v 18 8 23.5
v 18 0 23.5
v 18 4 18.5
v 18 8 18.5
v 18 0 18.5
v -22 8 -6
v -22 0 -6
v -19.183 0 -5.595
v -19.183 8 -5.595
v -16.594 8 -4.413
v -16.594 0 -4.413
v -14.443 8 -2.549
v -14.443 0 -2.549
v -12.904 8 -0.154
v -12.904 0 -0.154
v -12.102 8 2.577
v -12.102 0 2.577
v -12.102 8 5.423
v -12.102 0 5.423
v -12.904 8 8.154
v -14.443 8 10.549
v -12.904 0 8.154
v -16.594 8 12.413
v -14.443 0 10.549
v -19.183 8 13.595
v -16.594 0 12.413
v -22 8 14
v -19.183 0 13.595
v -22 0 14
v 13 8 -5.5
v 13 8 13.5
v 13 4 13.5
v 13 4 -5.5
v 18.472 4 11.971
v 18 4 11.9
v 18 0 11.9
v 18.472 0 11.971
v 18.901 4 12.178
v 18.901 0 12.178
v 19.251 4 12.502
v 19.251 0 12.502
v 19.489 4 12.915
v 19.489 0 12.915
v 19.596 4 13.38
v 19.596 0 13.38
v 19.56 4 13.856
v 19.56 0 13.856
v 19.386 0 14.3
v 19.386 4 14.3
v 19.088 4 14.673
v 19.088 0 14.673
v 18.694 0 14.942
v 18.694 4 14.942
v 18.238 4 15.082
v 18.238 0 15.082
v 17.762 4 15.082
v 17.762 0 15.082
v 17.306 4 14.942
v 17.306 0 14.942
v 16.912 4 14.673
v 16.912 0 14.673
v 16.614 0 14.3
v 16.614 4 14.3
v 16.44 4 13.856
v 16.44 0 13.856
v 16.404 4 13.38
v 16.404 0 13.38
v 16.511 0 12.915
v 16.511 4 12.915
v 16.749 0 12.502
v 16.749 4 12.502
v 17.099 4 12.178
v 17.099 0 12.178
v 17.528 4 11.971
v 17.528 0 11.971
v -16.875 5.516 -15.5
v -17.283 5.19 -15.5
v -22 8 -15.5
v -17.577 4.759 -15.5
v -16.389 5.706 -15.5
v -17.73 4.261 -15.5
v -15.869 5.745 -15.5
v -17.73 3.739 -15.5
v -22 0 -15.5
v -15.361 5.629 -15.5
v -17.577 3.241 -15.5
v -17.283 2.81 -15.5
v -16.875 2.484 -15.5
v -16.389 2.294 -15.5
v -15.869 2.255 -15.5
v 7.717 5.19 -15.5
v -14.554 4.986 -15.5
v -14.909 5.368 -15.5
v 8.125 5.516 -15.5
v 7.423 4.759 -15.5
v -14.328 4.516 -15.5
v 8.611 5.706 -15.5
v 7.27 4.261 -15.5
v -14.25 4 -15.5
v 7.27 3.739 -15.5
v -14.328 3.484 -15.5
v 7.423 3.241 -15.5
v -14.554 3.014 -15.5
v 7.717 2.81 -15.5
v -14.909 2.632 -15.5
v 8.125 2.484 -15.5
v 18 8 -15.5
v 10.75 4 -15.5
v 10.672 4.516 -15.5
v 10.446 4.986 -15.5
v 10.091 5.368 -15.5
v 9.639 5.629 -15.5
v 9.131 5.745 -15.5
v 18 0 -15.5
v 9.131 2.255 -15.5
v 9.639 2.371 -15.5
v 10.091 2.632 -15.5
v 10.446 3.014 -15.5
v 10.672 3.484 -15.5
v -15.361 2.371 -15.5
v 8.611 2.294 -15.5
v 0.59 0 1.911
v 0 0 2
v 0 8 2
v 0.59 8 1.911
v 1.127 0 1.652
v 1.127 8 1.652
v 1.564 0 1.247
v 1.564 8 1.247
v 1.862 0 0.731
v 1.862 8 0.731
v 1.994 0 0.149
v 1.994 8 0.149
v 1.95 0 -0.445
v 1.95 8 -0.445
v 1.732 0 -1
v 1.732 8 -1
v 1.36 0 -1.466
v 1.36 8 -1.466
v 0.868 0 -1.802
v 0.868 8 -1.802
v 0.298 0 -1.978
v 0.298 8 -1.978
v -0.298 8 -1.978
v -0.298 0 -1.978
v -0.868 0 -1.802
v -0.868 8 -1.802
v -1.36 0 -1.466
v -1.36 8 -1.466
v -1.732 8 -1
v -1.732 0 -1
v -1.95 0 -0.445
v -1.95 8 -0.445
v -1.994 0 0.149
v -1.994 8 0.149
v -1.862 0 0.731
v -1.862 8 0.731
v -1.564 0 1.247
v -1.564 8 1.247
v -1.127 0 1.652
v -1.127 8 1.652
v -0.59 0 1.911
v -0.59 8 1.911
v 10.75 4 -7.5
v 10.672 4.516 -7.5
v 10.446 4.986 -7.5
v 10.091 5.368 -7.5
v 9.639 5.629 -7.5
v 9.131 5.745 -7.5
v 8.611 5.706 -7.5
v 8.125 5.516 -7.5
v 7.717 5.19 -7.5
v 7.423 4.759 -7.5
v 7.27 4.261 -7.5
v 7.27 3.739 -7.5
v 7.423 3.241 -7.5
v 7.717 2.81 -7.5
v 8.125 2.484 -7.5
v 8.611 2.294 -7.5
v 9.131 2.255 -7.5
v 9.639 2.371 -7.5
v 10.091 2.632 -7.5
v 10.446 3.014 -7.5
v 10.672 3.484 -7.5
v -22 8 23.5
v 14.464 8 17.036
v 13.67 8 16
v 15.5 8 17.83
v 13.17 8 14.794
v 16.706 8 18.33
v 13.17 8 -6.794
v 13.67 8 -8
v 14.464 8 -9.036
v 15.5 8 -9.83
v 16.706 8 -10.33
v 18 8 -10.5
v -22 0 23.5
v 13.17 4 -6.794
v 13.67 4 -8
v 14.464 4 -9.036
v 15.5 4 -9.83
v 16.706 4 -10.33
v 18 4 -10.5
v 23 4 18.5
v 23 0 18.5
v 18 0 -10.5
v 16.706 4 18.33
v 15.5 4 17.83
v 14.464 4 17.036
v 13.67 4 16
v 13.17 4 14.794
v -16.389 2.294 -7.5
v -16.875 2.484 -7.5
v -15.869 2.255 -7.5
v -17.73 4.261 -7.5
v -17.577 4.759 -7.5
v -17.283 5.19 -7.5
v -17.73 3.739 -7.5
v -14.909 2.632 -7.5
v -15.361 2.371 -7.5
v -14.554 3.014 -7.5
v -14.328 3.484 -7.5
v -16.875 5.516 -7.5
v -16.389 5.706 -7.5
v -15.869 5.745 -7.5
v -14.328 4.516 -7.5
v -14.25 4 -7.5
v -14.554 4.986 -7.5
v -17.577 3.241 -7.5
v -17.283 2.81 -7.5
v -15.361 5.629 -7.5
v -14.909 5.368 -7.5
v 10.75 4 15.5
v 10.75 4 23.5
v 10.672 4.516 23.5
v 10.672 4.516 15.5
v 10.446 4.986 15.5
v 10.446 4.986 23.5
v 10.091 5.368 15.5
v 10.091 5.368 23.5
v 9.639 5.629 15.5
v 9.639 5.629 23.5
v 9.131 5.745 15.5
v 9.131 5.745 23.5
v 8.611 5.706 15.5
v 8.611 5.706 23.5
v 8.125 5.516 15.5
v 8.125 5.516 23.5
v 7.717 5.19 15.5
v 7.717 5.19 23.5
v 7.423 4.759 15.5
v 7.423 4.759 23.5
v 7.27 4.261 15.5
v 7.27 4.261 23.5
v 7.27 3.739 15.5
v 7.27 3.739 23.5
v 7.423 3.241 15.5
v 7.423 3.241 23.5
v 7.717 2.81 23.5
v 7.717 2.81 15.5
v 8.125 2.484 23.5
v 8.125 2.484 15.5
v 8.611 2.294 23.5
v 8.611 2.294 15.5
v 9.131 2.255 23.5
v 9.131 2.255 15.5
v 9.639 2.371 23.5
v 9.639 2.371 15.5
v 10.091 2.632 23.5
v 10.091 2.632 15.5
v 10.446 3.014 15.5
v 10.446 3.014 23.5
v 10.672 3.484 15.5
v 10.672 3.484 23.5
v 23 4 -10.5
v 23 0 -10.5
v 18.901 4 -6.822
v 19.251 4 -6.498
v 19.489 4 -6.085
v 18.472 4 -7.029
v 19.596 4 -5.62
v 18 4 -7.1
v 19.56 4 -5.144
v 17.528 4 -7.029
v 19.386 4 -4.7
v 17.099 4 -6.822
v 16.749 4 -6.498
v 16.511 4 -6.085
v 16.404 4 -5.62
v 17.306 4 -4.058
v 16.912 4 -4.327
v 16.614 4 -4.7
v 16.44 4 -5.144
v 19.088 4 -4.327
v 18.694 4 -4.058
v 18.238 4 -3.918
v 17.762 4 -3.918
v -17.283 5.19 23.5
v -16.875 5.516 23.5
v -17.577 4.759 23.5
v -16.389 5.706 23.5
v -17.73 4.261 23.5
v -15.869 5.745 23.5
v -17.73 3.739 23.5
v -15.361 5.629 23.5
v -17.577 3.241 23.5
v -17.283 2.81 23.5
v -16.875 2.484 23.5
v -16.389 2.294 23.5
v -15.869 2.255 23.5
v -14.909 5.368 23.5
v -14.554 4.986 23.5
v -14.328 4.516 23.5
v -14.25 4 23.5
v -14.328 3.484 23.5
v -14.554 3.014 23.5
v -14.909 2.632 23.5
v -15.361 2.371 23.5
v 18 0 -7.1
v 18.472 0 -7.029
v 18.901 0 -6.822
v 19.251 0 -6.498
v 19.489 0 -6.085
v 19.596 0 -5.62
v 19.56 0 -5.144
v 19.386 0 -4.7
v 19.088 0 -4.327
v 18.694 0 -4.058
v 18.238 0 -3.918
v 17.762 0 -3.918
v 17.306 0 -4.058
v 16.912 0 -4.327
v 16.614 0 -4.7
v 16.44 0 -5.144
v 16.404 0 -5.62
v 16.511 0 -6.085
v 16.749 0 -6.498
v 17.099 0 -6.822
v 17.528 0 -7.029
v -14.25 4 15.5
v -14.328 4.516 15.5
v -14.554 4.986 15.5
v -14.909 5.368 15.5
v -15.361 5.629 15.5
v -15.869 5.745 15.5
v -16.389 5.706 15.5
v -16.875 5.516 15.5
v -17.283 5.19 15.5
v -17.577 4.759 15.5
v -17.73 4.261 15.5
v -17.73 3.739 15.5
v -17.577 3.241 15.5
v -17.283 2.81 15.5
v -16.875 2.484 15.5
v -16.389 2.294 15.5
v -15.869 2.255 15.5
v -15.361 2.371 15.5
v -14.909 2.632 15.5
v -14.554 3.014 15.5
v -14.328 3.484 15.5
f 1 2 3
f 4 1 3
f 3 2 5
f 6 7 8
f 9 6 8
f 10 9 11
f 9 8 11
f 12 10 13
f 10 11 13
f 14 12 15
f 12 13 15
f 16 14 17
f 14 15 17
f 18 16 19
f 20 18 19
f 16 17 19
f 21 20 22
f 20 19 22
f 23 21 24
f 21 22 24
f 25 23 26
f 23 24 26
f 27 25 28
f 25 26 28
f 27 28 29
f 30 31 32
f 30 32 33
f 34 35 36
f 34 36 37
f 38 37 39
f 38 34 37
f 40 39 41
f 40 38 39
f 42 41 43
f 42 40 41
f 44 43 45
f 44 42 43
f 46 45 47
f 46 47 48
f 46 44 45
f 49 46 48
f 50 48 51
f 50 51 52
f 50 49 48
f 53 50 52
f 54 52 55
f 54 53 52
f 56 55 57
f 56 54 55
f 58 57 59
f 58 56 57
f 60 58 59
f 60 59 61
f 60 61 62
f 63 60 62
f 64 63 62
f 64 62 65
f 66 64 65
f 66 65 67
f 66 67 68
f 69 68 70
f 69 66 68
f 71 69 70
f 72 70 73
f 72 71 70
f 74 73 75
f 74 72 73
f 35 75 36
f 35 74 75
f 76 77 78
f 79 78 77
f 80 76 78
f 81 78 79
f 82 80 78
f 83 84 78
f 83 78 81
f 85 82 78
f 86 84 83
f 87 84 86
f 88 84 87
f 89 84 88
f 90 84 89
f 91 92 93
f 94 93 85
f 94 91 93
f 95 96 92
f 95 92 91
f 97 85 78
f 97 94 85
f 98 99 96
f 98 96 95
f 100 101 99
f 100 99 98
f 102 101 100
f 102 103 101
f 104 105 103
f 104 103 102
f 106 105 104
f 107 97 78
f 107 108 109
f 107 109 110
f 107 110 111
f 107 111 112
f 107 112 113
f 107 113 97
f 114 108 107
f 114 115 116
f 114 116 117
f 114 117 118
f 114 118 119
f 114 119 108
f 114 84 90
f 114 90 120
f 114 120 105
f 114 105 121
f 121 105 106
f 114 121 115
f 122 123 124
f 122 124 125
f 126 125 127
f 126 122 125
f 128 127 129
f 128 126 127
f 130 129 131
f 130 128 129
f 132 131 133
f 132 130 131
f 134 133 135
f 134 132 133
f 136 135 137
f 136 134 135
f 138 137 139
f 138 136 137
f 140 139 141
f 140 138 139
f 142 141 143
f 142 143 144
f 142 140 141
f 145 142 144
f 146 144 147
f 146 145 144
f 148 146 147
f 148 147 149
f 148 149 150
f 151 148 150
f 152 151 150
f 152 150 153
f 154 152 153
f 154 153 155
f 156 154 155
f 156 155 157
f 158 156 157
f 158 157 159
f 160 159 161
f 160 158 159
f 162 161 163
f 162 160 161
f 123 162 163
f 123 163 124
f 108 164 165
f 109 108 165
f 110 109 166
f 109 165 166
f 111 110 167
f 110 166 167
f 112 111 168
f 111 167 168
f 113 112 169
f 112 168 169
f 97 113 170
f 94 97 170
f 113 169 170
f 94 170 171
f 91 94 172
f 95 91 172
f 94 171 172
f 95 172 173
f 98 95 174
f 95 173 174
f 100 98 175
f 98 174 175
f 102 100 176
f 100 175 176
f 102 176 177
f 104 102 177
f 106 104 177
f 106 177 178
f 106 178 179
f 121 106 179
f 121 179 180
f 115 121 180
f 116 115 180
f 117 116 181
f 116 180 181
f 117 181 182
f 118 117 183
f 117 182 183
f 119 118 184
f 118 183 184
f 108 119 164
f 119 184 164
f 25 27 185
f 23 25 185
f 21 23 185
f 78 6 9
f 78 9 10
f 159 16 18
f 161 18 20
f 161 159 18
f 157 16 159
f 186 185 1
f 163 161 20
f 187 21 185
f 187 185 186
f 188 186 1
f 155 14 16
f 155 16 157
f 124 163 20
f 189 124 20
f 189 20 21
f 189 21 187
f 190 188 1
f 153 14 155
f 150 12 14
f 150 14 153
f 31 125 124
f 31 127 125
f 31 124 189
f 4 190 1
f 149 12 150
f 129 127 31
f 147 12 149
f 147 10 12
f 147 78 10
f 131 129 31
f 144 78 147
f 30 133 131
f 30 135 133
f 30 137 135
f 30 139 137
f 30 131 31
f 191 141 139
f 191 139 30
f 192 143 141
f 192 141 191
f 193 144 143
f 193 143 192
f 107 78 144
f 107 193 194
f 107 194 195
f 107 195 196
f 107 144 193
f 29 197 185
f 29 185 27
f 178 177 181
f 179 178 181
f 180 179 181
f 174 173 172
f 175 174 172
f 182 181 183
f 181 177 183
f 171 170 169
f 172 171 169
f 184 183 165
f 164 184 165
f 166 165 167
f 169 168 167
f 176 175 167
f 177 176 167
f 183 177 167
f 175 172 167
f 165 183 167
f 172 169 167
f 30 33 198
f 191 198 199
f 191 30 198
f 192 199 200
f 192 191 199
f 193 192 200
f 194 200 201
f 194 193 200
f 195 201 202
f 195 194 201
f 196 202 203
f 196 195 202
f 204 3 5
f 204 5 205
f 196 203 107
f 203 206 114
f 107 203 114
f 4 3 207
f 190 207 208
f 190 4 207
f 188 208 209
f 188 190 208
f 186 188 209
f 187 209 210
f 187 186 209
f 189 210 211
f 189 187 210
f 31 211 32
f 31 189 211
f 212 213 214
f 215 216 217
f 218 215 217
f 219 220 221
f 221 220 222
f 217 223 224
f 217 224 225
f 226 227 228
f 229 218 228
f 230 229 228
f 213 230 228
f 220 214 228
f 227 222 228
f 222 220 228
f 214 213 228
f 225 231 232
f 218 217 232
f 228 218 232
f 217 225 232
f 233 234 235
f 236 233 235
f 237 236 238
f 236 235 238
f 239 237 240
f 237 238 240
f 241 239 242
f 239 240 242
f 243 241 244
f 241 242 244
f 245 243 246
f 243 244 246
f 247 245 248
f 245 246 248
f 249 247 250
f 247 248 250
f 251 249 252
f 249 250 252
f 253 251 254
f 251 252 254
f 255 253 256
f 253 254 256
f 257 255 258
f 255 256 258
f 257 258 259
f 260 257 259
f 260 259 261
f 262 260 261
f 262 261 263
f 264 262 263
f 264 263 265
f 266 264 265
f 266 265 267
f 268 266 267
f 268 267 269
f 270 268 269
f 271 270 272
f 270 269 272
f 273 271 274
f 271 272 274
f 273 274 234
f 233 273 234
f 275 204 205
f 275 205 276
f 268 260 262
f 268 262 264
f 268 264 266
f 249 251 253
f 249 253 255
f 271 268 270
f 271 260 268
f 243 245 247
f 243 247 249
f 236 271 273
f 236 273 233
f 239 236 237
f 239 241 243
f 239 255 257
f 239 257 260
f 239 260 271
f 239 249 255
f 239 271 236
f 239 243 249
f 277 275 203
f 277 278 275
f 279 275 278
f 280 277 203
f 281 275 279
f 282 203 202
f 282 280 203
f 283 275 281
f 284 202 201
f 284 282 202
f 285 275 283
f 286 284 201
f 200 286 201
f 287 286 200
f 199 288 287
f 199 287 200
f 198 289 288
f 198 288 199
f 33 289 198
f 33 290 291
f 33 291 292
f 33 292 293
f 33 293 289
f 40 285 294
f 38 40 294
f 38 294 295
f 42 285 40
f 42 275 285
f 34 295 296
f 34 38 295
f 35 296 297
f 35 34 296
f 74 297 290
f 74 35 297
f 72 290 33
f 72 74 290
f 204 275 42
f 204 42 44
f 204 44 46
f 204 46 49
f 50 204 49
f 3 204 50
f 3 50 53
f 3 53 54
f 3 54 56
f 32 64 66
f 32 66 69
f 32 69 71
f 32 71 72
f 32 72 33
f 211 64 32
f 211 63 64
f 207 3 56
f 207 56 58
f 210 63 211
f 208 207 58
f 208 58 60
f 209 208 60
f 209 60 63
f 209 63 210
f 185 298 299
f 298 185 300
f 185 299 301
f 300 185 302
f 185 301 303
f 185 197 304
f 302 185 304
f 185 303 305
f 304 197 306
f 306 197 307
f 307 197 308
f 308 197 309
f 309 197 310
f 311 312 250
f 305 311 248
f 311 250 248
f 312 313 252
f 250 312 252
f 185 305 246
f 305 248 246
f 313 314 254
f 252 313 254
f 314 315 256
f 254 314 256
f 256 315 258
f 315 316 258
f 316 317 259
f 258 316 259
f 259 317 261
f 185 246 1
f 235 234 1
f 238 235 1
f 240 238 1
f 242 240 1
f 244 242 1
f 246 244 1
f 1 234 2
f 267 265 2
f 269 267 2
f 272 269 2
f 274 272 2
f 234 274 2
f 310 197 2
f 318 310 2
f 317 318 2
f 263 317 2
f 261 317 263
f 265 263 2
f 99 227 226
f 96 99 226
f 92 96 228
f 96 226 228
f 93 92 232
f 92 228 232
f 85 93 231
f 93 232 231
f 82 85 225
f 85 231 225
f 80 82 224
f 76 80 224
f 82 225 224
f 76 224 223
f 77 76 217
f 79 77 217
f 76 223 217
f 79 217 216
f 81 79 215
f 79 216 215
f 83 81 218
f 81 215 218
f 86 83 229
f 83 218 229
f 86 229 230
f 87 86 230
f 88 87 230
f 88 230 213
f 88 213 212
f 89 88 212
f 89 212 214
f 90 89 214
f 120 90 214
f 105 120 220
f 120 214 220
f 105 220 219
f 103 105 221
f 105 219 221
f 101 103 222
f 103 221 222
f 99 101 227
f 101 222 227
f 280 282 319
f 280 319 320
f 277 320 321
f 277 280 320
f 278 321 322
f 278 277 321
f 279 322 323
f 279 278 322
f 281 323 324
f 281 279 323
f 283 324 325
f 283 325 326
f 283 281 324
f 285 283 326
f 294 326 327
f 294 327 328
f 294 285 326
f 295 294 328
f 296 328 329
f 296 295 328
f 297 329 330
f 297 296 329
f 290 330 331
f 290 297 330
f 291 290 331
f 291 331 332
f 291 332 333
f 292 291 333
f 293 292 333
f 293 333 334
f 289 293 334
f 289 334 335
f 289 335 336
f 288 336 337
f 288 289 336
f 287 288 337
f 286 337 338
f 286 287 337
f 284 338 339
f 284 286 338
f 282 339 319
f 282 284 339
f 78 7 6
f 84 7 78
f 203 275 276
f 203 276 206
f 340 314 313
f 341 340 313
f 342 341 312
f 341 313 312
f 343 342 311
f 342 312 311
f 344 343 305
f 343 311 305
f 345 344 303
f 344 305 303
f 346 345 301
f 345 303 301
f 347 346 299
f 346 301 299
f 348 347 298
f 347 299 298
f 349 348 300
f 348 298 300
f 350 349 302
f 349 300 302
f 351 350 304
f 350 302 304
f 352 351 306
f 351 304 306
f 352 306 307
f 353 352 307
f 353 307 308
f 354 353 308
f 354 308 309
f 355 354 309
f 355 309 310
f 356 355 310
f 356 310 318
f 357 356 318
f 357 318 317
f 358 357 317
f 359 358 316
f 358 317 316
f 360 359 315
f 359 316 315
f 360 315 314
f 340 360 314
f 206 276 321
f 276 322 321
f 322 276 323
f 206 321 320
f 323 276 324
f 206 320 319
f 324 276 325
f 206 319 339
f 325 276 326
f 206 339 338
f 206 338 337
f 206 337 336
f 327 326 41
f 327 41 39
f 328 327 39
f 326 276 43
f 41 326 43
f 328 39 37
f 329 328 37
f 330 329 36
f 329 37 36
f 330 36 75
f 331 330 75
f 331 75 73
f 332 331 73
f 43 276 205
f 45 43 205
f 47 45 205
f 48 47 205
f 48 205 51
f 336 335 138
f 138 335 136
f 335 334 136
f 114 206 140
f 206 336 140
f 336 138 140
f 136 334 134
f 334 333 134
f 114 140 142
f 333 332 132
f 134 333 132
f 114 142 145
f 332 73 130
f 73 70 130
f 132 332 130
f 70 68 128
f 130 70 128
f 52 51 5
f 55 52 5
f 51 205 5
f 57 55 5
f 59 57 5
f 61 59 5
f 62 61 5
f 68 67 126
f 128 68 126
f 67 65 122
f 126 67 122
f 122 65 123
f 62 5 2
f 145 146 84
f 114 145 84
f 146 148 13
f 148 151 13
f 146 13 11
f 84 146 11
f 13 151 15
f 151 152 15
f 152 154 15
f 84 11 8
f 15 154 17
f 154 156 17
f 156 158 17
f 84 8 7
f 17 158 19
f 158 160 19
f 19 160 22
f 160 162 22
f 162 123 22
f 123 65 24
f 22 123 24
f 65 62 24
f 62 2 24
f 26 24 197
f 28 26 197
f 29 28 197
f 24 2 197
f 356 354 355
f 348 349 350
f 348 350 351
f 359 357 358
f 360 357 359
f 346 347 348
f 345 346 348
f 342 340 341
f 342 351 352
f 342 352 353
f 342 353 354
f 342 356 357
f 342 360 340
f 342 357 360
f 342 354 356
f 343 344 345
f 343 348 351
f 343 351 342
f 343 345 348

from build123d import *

# Parameters (mm, degrees)
SKETCH_1_W          = 40
SKETCH_1_H          = 39
SKETCH_1_R          = 2
EXTRUDE_1_DEPTH     = 8
SKETCH_2_R          = 1.75
CUT_EXTRUDE_1_DEPTH = 8
CUT_EXTRUDE_START   = -31
SKETCH_2_3_R        = 1.75
CUT_EXTRUDE_2_DEPTH = 8
SKETCH_4_R          = 10
CUT_EXTRUDE_3_DEPTH = 10
CUT_EXTRUDE_5_DEPTH = 10
EXTRUDE_START       = -4
SKETCH_7_R          = 1.6
EXTRUDE_2_DEPTH     = 4


with BuildPart() as part:
    # 草图1 → 凸台-拉伸1 (new body)
    with BuildSketch(Plane(origin=(0, 0, 0), x_dir=(1, 0, 0), z_dir=(0, 1, 0))):
        with Locations((-2, -4)):
            Rectangle(SKETCH_1_W, SKETCH_1_H)
        with Locations(Location((0, 0, 0), (0, 0, 270))):
            Circle(SKETCH_1_R, mode=Mode.SUBTRACT)
    extrude(amount=EXTRUDE_1_DEPTH)

    # 草图2 → 切除-拉伸1 (cut)
    with BuildSketch(Plane.XY.offset(23.5)):
        with Locations((9, 4)):
            Circle(SKETCH_2_R)
        with Locations((-16, 4)):
            Circle(SKETCH_2_R)
    extrude(amount=-CUT_EXTRUDE_1_DEPTH, mode=Mode.SUBTRACT)

    # 草图2<3> → 切除-拉伸2 (cut)
    with BuildSketch(Plane.XY.offset(23.5).offset(CUT_EXTRUDE_START)):
        with Locations((9, 4)):
            Circle(SKETCH_2_3_R)
        with Locations((-16, 4)):
            Circle(SKETCH_2_3_R)
    extrude(amount=-CUT_EXTRUDE_2_DEPTH, mode=Mode.SUBTRACT)

    # 草图4 → 切除-拉伸3 (cut)
    with BuildSketch(Plane(origin=(0, 0, 0), x_dir=(-1, 0, 0), z_dir=(0, -1, 0))):
        with Locations((22, -4)):
            Circle(SKETCH_4_R)
    extrude(amount=-CUT_EXTRUDE_3_DEPTH, mode=Mode.SUBTRACT)

    # 草图6 → 切除-拉伸5 (cut)
    with BuildSketch(Plane(origin=(0, 8, 0), x_dir=(1, 0, 0), z_dir=(0, 1, 0))):
        with BuildLine():
            Line((13, -13.5), (13, 5.5))
            ThreePointArc((13, 5.5), (18, 10.5), (23, 5.5))
            Line((23, 5.5), (23, -13.5))
            ThreePointArc((23, -13.5), (18, -18.5), (13, -13.5))
        make_face()
    extrude(amount=-CUT_EXTRUDE_5_DEPTH, mode=Mode.SUBTRACT)

    # 草图7 → 凸台-拉伸2 (add)
    with BuildSketch(Plane.XZ.offset(EXTRUDE_START)):
        with BuildLine():
            Line((13, -5.5), (13, 13.5))
            ThreePointArc((13, 13.5), (14.464466094, 17.035533906), (18, 18.5))
            Line((18, 18.5), (23, 18.5))
            Line((23, 18.5), (23, -10.5))
            Line((23, -10.5), (18, -10.5))
            ThreePointArc((18, -10.5), (14.464466094, -9.035533906), (13, -5.5))
        make_face()
        with Locations(Location((18, 13.5, 0), (0, 0, 270))):
            Circle(SKETCH_7_R, mode=Mode.SUBTRACT)
        with Locations(Location((18, -5.5, 0), (0, 0, 270))):
            Circle(SKETCH_7_R, mode=Mode.SUBTRACT)
    extrude(amount=EXTRUDE_2_DEPTH)


solid = part.part
